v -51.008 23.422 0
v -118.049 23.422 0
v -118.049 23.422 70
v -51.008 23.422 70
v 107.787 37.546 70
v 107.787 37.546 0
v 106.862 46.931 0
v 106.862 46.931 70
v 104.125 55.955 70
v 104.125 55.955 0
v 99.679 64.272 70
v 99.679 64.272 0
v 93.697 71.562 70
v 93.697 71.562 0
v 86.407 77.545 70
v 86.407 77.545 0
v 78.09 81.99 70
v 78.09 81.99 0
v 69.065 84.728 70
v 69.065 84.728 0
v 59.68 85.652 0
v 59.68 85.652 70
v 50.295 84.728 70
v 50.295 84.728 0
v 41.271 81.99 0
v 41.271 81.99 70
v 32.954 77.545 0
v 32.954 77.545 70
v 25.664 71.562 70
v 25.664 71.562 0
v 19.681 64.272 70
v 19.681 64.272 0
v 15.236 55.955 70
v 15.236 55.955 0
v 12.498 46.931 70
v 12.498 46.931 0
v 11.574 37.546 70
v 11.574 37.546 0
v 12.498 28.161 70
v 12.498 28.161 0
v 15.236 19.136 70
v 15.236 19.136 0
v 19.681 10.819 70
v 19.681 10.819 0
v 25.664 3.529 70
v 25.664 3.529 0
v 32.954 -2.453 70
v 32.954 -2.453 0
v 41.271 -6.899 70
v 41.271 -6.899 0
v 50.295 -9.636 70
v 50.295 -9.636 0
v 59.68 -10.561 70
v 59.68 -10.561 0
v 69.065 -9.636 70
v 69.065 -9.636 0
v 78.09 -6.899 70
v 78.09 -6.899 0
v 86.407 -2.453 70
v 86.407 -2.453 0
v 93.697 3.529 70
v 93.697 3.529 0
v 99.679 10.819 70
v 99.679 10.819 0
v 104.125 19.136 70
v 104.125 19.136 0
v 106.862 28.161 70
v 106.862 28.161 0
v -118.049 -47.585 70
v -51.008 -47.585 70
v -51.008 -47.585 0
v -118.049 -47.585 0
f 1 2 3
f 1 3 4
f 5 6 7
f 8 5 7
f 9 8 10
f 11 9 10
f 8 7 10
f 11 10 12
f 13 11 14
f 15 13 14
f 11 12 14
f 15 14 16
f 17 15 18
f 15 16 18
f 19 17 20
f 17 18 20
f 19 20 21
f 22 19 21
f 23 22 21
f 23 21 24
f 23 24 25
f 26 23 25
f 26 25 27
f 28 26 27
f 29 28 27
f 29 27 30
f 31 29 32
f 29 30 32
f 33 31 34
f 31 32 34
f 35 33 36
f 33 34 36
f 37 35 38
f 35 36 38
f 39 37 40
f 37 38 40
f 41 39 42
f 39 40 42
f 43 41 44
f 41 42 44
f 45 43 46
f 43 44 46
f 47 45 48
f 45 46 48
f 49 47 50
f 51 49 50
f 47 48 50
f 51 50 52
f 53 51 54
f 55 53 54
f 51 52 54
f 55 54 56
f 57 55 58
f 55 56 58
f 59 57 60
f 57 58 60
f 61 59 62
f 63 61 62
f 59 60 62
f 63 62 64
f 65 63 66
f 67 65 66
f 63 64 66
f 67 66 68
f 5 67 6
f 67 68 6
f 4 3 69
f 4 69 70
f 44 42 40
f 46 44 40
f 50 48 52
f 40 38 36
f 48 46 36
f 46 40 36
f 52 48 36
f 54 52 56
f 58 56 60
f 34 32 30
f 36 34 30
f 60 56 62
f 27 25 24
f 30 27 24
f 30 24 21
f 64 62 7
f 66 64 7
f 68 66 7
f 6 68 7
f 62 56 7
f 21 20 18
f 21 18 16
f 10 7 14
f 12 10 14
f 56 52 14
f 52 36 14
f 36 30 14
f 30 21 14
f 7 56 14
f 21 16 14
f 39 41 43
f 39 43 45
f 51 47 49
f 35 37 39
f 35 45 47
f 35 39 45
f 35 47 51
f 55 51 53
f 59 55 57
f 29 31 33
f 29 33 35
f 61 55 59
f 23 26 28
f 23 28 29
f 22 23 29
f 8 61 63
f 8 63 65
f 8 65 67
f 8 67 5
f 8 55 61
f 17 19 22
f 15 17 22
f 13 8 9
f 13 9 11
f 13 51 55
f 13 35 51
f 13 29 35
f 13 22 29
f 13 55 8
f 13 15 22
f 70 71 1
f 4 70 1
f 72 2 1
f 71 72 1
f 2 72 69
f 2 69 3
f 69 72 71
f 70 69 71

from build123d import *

# Parameters (mm, degrees)
F0_W     = 67.040946
F0_H     = 71.007516
F0_R     = 48.106438
F1_DEPTH = 70


with BuildPart() as f1:
    # F0 (on Top) → F1 (new body)
    with BuildSketch(Plane.XY):
        with Locations((-84.528351, -12.081677)):
            Rectangle(F0_W, F0_H)
        with Locations((59.680231, 37.545782)):
            Circle(F0_R)
    extrude(amount=F1_DEPTH)


solid = f1.part
